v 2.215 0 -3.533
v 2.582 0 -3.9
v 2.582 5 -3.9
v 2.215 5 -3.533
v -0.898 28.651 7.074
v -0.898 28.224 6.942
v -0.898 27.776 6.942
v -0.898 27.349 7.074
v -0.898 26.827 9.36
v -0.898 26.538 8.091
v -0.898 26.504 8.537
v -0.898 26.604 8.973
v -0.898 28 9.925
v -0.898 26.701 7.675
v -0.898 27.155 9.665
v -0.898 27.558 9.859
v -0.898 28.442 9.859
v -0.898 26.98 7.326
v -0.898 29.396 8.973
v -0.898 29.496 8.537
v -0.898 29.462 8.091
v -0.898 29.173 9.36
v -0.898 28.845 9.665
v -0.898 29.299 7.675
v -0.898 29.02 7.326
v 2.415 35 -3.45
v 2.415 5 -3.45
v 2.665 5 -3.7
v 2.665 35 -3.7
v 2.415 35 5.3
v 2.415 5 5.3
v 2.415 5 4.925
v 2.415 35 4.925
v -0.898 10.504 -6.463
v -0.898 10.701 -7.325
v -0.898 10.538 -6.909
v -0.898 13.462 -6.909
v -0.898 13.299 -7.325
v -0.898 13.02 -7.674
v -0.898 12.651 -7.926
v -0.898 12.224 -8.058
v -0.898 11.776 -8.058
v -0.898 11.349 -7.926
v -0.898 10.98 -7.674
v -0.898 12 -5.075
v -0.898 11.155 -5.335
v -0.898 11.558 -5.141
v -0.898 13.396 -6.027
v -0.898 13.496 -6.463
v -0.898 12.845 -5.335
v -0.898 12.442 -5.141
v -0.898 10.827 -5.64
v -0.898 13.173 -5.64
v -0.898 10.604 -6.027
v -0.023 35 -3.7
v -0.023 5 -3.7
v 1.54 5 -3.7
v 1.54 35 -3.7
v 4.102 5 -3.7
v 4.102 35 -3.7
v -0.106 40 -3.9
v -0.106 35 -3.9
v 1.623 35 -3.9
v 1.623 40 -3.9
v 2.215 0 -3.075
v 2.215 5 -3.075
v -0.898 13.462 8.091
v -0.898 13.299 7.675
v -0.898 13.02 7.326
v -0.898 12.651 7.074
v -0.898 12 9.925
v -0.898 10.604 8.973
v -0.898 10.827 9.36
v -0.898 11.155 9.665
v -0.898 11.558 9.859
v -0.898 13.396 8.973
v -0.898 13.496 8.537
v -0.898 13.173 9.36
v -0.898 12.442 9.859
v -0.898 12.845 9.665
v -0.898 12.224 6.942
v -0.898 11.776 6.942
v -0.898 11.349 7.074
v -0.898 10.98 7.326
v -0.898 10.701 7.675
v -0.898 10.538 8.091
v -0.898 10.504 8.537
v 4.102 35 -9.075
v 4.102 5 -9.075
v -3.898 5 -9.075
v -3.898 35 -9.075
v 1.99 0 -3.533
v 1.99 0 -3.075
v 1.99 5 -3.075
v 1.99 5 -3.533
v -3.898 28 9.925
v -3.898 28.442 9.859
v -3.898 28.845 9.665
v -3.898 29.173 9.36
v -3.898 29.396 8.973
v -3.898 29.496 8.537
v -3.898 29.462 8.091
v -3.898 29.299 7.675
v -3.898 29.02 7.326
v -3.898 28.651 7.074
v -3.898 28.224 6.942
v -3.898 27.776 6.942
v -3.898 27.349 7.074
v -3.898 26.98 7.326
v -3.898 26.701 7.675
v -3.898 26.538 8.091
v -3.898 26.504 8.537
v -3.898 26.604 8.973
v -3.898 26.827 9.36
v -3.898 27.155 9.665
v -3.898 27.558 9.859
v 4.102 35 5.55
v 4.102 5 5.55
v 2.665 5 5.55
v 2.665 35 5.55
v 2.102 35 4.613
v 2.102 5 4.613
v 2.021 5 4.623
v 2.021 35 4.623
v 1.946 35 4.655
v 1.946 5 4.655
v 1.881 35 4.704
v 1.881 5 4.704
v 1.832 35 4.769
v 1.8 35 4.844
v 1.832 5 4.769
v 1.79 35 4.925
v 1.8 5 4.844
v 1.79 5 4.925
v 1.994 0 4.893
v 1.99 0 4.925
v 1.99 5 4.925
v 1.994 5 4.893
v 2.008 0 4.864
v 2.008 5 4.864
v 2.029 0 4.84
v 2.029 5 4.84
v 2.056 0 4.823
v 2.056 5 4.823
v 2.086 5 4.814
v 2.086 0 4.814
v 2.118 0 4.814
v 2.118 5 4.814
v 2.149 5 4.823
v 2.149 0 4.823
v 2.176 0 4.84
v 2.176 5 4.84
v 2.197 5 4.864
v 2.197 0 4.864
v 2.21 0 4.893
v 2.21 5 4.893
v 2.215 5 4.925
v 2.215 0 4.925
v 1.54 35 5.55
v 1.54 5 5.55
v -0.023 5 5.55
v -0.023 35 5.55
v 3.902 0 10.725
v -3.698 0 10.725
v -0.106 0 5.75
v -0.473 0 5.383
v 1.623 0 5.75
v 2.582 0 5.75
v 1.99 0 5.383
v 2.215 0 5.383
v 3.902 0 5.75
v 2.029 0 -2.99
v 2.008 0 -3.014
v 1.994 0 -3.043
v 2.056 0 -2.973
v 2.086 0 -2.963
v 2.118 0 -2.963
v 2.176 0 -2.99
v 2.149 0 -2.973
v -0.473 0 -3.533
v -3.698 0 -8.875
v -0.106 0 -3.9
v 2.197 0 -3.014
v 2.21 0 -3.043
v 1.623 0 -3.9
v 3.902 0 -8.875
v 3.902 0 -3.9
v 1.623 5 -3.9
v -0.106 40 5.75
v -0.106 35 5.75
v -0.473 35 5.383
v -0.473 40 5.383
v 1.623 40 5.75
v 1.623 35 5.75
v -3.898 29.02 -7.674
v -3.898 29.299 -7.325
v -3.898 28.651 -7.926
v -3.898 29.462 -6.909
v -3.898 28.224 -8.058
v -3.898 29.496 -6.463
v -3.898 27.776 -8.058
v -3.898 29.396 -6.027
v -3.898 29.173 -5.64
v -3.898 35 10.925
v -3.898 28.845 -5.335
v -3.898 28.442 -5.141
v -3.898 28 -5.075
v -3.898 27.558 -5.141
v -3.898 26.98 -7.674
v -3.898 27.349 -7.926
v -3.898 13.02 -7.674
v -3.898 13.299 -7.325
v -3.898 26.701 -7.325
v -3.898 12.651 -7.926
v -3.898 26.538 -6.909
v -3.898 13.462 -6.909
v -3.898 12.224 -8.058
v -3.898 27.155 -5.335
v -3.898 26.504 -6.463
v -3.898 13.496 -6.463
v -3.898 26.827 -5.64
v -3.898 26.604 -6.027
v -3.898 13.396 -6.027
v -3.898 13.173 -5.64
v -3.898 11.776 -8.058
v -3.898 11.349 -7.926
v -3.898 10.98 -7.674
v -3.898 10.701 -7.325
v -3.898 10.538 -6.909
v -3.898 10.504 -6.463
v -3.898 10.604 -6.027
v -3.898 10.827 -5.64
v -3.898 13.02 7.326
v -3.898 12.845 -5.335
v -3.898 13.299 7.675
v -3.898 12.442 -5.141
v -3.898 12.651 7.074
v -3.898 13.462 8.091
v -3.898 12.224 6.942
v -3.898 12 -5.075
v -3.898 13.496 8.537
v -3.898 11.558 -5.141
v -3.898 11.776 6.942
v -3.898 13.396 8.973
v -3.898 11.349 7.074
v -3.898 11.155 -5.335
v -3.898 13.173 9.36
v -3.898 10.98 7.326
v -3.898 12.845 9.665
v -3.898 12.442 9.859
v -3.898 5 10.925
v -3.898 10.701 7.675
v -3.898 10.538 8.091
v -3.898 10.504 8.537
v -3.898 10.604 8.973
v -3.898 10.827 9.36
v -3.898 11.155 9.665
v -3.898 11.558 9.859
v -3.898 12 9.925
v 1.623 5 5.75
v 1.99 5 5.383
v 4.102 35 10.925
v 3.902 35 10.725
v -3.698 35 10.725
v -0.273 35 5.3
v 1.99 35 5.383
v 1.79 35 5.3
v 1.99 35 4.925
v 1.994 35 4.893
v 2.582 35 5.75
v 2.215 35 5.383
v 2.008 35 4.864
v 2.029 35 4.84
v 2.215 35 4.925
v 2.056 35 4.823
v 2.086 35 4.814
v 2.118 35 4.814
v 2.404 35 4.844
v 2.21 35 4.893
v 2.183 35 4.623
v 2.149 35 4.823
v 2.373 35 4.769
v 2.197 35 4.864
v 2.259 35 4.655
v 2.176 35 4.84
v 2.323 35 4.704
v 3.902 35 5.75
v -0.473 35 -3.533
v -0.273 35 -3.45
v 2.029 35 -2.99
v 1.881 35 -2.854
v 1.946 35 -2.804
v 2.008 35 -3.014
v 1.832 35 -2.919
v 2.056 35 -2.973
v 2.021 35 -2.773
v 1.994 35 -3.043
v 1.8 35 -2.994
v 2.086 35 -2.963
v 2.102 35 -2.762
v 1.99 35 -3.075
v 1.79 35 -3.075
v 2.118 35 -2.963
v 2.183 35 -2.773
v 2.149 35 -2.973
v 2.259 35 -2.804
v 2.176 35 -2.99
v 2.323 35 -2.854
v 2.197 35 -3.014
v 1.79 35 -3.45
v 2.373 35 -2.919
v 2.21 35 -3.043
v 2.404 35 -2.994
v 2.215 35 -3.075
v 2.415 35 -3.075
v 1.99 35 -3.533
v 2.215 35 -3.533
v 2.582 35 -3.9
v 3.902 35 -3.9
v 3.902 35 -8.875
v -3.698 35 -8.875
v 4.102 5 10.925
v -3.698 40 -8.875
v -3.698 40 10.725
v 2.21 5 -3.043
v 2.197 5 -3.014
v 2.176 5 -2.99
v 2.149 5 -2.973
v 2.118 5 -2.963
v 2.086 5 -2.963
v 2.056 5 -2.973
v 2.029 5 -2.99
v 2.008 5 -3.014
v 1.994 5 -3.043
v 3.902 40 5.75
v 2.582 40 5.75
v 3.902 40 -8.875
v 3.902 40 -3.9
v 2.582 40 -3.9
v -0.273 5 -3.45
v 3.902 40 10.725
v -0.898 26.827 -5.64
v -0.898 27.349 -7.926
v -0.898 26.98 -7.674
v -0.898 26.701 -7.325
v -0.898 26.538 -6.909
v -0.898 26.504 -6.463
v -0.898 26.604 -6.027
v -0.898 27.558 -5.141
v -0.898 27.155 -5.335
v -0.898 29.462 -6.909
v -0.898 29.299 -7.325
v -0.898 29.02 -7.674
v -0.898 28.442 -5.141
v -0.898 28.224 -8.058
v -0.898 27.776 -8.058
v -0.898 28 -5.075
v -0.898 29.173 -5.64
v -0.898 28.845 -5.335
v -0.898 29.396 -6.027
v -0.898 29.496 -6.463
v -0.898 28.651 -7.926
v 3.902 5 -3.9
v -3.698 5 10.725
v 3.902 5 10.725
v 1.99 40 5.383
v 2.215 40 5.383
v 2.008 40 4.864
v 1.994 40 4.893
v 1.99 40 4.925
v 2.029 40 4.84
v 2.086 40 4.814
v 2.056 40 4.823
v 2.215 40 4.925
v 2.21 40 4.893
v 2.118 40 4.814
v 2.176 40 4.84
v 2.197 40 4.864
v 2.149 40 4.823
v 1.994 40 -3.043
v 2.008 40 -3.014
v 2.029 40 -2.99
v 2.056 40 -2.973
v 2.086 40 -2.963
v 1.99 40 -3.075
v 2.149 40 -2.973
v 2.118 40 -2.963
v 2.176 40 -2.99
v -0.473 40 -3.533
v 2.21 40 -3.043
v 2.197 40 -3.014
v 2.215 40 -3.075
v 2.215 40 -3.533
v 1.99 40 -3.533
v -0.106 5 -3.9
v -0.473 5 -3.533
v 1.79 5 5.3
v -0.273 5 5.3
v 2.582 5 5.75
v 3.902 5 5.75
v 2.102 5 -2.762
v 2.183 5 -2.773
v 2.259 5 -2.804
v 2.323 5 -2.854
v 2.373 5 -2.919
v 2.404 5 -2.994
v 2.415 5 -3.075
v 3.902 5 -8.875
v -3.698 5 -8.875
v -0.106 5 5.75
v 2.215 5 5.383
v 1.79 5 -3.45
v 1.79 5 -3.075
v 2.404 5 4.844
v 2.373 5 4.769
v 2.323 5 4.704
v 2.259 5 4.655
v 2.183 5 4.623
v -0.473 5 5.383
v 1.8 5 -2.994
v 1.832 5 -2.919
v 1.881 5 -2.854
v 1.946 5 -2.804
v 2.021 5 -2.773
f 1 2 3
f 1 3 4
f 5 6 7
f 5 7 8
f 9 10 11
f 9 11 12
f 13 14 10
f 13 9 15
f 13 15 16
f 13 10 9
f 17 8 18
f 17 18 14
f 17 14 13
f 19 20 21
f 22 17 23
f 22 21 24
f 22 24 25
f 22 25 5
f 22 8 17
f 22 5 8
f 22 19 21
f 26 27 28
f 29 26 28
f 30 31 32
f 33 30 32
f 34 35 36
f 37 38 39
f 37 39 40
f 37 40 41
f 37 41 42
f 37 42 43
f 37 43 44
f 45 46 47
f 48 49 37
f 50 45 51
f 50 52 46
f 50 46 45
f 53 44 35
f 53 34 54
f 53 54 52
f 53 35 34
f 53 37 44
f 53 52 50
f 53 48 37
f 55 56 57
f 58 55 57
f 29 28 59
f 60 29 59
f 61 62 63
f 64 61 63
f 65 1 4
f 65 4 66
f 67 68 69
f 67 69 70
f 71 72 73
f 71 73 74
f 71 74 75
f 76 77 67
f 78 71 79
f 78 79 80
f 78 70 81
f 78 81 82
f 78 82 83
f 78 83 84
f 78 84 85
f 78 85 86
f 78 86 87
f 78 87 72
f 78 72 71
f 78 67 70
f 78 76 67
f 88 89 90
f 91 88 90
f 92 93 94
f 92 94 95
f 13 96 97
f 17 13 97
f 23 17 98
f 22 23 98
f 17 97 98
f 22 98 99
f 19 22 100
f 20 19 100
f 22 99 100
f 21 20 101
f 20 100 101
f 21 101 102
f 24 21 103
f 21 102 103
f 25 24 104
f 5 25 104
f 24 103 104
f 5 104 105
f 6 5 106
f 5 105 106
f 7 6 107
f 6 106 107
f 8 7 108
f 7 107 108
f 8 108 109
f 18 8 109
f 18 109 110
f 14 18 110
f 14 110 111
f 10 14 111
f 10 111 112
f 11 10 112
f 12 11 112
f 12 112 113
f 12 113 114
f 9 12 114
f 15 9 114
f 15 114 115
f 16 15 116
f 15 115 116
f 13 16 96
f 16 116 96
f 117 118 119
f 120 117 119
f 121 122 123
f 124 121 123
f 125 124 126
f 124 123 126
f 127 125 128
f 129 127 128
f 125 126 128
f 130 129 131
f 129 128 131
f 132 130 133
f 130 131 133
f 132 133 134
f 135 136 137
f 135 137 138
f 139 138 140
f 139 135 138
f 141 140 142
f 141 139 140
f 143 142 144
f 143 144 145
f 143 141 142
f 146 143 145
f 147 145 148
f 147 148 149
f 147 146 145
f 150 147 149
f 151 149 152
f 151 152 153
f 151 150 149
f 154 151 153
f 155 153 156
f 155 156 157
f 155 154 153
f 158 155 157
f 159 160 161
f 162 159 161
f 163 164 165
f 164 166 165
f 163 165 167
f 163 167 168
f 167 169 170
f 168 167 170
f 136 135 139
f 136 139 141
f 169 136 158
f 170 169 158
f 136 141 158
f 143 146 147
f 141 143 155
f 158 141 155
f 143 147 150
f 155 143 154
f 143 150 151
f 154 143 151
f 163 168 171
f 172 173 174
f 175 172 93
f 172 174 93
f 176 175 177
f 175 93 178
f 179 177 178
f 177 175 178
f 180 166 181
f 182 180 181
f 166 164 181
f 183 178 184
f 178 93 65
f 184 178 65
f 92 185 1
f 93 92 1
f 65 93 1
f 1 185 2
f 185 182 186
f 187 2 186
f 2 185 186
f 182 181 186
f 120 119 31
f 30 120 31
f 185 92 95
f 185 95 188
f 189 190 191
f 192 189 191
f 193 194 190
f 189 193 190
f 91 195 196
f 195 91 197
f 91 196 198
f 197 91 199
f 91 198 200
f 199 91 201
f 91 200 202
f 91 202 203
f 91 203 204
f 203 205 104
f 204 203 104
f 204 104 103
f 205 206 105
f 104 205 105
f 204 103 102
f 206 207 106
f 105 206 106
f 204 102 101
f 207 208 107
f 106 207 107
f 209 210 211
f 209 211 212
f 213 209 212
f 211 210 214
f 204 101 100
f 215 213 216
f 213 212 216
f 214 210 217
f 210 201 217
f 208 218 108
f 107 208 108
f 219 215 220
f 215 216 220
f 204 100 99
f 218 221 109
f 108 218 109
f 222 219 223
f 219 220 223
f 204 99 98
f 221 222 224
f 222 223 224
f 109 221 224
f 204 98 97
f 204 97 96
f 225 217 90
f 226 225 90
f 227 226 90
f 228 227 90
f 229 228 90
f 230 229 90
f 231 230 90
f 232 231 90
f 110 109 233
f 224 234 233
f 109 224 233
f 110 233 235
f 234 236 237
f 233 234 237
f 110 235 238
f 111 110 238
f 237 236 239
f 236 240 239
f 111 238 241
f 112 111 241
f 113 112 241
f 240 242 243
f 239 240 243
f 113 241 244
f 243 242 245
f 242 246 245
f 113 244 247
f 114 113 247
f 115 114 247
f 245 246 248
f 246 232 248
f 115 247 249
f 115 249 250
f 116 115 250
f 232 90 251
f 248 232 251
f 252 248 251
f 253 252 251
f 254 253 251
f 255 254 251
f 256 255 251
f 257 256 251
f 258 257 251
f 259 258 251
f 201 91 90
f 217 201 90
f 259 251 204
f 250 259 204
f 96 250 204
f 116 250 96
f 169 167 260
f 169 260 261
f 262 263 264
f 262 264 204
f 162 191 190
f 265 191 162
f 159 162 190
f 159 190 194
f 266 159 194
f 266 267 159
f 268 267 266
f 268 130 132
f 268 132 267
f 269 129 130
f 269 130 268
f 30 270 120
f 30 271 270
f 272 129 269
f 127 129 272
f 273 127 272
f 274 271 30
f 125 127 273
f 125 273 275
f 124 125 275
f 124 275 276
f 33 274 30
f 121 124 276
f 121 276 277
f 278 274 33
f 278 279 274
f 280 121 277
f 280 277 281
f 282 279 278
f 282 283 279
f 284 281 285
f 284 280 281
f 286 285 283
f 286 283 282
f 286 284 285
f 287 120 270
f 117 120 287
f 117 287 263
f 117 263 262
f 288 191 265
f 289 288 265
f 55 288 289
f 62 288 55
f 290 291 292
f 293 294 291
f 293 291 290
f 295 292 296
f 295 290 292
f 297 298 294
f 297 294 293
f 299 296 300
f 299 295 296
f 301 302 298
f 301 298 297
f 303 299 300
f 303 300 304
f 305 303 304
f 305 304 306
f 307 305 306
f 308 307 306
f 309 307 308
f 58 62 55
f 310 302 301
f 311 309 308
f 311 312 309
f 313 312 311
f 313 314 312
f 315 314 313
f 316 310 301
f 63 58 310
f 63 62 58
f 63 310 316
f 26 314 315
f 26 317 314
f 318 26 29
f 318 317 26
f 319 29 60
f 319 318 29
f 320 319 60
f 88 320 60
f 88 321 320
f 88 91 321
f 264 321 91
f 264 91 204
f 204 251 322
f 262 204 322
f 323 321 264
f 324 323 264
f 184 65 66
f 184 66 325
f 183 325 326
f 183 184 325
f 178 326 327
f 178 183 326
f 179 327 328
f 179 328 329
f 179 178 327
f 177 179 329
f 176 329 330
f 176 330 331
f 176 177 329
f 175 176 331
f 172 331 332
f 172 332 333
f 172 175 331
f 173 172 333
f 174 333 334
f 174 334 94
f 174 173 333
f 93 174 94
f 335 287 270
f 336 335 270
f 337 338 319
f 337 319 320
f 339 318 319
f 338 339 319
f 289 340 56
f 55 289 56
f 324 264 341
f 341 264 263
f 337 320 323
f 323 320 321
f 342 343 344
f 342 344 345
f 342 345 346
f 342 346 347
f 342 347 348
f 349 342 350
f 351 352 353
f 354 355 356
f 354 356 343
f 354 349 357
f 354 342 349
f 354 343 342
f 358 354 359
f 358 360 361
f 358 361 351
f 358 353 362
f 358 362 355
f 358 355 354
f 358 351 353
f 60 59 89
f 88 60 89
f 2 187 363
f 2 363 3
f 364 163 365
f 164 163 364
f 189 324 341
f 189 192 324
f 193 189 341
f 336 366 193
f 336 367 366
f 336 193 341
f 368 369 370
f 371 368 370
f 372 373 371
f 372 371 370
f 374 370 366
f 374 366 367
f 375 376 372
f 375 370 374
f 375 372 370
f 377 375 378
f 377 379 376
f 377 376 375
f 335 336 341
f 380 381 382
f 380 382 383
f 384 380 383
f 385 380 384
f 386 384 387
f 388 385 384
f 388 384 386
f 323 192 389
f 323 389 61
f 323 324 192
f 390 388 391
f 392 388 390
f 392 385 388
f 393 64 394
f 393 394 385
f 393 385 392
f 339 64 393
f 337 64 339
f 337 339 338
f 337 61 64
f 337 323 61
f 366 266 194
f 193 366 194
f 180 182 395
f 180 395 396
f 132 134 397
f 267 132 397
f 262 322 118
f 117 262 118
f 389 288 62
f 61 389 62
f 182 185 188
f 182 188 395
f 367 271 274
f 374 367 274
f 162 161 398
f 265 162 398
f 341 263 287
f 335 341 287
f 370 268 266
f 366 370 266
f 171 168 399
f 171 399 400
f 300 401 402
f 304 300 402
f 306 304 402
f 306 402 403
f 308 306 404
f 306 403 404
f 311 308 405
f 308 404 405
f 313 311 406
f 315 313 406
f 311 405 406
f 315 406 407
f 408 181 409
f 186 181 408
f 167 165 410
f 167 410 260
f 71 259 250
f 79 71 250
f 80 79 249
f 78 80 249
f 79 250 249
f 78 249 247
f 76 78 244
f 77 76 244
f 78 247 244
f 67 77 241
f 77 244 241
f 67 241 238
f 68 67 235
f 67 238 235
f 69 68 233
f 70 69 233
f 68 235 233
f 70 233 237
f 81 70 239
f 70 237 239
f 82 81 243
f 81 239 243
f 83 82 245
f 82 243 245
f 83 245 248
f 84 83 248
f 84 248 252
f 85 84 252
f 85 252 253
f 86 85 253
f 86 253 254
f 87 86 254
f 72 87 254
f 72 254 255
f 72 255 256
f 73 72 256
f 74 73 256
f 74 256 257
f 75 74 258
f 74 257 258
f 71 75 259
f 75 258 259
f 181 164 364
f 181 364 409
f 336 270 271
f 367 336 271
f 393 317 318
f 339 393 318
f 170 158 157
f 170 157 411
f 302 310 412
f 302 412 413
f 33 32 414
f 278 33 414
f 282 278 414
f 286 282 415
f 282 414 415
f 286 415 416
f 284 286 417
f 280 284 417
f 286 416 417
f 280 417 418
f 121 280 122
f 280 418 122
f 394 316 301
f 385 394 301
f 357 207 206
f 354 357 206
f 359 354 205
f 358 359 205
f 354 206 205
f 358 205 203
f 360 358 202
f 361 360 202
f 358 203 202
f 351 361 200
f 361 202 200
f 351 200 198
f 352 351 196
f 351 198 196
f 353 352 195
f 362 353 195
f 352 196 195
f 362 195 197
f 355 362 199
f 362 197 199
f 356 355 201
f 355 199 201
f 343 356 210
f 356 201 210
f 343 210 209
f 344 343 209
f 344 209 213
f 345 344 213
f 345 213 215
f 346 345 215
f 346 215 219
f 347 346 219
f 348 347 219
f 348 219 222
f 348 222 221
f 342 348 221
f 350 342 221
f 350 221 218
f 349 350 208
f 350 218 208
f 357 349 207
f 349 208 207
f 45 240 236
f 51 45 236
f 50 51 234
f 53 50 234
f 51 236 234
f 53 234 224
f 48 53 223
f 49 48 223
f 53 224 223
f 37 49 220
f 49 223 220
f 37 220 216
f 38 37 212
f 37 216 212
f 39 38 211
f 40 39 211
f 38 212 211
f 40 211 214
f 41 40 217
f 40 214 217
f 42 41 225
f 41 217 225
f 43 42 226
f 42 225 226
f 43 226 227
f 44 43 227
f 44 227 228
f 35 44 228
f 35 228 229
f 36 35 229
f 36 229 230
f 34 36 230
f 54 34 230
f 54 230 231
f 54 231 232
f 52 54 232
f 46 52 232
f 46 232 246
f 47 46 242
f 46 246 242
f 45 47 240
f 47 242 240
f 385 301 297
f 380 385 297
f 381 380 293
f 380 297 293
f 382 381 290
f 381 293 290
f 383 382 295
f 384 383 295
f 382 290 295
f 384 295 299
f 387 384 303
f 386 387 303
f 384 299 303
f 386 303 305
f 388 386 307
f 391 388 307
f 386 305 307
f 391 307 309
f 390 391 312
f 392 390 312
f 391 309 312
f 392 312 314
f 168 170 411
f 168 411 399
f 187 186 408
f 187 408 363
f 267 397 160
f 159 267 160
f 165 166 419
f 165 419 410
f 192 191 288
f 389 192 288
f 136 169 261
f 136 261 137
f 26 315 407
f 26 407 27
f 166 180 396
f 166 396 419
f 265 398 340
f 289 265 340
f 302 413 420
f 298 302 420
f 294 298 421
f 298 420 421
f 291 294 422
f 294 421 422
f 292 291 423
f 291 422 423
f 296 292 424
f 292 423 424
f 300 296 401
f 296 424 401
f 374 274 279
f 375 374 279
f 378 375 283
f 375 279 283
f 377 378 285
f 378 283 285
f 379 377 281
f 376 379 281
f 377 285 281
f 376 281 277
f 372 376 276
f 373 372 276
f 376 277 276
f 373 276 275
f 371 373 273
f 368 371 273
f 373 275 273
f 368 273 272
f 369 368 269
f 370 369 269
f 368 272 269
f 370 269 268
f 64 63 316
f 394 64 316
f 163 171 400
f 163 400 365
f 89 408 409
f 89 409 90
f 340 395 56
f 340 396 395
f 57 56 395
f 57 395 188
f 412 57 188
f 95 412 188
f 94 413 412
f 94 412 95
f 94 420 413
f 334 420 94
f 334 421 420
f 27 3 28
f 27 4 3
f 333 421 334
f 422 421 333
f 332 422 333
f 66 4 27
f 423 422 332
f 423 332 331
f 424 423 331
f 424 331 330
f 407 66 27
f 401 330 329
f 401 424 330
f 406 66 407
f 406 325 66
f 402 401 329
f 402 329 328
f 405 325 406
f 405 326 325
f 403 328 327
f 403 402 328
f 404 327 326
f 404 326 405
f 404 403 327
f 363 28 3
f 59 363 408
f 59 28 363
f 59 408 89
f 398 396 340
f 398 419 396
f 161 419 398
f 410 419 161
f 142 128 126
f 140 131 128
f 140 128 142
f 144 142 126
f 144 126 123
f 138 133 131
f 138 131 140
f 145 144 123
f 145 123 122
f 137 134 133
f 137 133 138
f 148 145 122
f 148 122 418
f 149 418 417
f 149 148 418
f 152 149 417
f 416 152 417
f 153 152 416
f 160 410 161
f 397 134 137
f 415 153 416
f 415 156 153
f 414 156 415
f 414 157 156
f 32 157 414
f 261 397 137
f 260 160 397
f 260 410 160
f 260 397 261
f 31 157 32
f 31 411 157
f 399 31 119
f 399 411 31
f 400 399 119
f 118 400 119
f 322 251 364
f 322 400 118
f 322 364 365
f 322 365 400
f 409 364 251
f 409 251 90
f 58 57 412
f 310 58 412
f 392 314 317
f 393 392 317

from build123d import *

# Parameters (mm, degrees)
BOSS_EXTRUDE1_DEPTH = 40
CUT_EXTRUDE6_START  = -5
CUT_EXTRUDE6_DEPTH  = 5
CUT_EXTRUDE7_DEPTH  = 5
SKETCH10_R          = 1.5
CUT_EXTRUDE8_DEPTH  = 3
CUT_EXTRUDE4_START  = -5
CUT_EXTRUDE4_DEPTH  = 5
CUT_EXTRUDE5_DEPTH  = 5


with BuildPart() as part:
    # Sketch1 → Boss-Extrude1 (new body)
    with BuildSketch(Plane(origin=(0, 0, 0), x_dir=(1, 0, 0), z_dir=(0, 1, 0))):
        with BuildLine():
            Line((-3.897731109, -10.925164292), (4.102268891, -10.925164292))
            Line((4.102268891, -10.925164292), (4.102268891, -5.550166604))
            Line((4.102268891, -5.550166604), (3.383518531, -5.550166604))
            Line((3.383518531, -5.550166604), (2.664768172, -5.550166604))
            Line((2.664768172, -5.550166604), (2.414768047, -5.300166479))
            Line((2.414768047, -5.300166479), (2.414768047, -4.925166292))
            ThreePointArc((2.414768047, -4.925166292), (2.32323887, -4.704195312), (2.102267891, -4.612666136))
            ThreePointArc((2.102267891, -4.612666136), (1.881296911, -4.704195312), (1.789767734, -4.925166292))
            Line((1.789767734, -4.925166292), (1.789767734, -5.300166479))
            Line((1.789767734, -5.300166479), (1.539767609, -5.550166604))
            Line((1.539767609, -5.550166604), (-0.022733172, -5.550166604))
            Line((-0.022733172, -5.550166604), (-0.272733297, -5.300166479))
            Line((-0.272733297, -5.300166479), (-0.272733297, 3.449837896))
            Line((-0.272733297, 3.449837896), (-0.022733172, 3.699838021))
            Line((-0.022733172, 3.699838021), (1.539767609, 3.699838021))
            Line((1.539767609, 3.699838021), (1.789767734, 3.449837896))
            Line((1.789767734, 3.449837896), (1.789767734, 3.074837708))
            ThreePointArc((1.789767734, 3.074837708), (1.881296911, 2.853866728), (2.102267891, 2.762337552))
            ThreePointArc((2.102267891, 2.762337552), (2.32323887, 2.853866728), (2.414768047, 3.074837708))
            Line((2.414768047, 3.074837708), (2.414768047, 3.449837896))
            Line((2.414768047, 3.449837896), (2.664768172, 3.699838021))
            Line((2.664768172, 3.699838021), (3.383518531, 3.699838021))
            Line((3.383518531, 3.699838021), (4.102268891, 3.699838021))
            Line((4.102268891, 3.699838021), (4.102268891, 9.074835708))
            Line((4.102268891, 9.074835708), (-3.897731109, 9.074835708))
            Line((-3.897731109, 9.074835708), (-3.897731109, -10.925164292))
        make_face()
    extrude(amount=BOSS_EXTRUDE1_DEPTH)

    # Sketch8 → Cut-Extrude6 (cut)
    with BuildSketch(Plane(origin=(0, 40, 0), x_dir=(1, 0, 0), z_dir=(0, 1, 0)).offset(CUT_EXTRUDE6_START)):
        with BuildLine():
            Line((2.414768047, 3.074837708), (2.414768047, 3.449837896))
            Line((2.414768047, 3.449837896), (2.664768172, 3.699838021))
            Line((2.664768172, 3.699838021), (4.102268891, 3.699838021))
            Line((4.102268891, 3.699838021), (4.102268891, 9.074835708))
            Line((4.102268891, 9.074835708), (-3.897731109, 9.074835708))
            Line((-3.897731109, 9.074835708), (-3.897731109, -10.925164292))
            Line((-3.897731109, -10.925164292), (4.102268891, -10.925164292))
            Line((4.102268891, -10.925164292), (4.102268891, -5.550166604))
            Line((4.102268891, -5.550166604), (2.664768172, -5.550166604))
            Line((2.664768172, -5.550166604), (2.414768047, -5.300166479))
            Line((2.414768047, -5.300166479), (2.414768047, -4.925166292))
            ThreePointArc((2.414768047, -4.925166292), (2.102267891, -4.612666136), (1.789767734, -4.925166292))
            Line((1.789767734, -4.925166292), (1.789767734, -5.300166479))
            Line((1.789767734, -5.300166479), (1.539767609, -5.550166604))
            Line((1.539767609, -5.550166604), (-0.022733172, -5.550166604))
            Line((-0.022733172, -5.550166604), (-0.272733297, -5.300166479))
            Line((-0.272733297, -5.300166479), (-0.272733297, 3.449837896))
            Line((-0.272733297, 3.449837896), (-0.022733172, 3.699838021))
            Line((-0.022733172, 3.699838021), (1.539767609, 3.699838021))
            Line((1.539767609, 3.699838021), (1.789767734, 3.449837896))
            Line((1.789767734, 3.449837896), (1.789767734, 3.074837708))
            ThreePointArc((1.789767734, 3.074837708), (2.102267891, 2.762337552), (2.414768047, 3.074837708))
        make_face()
        with BuildLine():
            Line((2.314768047, 3.074837708), (2.314768047, 3.491259252))
            Line((2.314768047, 3.491259252), (2.623346816, 3.799838021))
            Line((2.623346816, 3.799838021), (4.002268891, 3.799838021))
            Line((4.002268891, 3.799838021), (4.002268891, 8.974835708))
            Line((4.002268891, 8.974835708), (-3.797731109, 8.974835708))
            Line((-3.797731109, 8.974835708), (-3.797731109, -10.825164292))
            Line((-3.797731109, -10.825164292), (4.002268891, -10.825164292))
            Line((4.002268891, -10.825164292), (4.002268891, -5.650166604))
            Line((4.002268891, -5.650166604), (2.623346816, -5.650166604))
            Line((2.623346816, -5.650166604), (2.314768047, -5.341587836))
            Line((2.314768047, -5.341587836), (2.314768047, -4.925166292))
            ThreePointArc((2.314768047, -4.925166292), (2.102267891, -4.712666136), (1.889767734, -4.925166292))
            Line((1.889767734, -4.925166292), (1.889767734, -5.341587836))
            Line((1.889767734, -5.341587836), (1.581188966, -5.650166604))
            Line((1.581188966, -5.650166604), (-0.064154528, -5.650166604))
            Line((-0.064154528, -5.650166604), (-0.372733297, -5.341587836))
            Line((-0.372733297, -5.341587836), (-0.372733297, 3.491259252))
            Line((-0.372733297, 3.491259252), (-0.064154528, 3.799838021))
            Line((-0.064154528, 3.799838021), (1.581188966, 3.799838021))
            Line((1.581188966, 3.799838021), (1.889767734, 3.491259252))
            Line((1.889767734, 3.491259252), (1.889767734, 3.074837708))
            ThreePointArc((1.889767734, 3.074837708), (2.102267891, 2.862337552), (2.314768047, 3.074837708))
        make_face(mode=Mode.SUBTRACT)
    extrude(amount=CUT_EXTRUDE6_DEPTH, mode=Mode.SUBTRACT)

    # Sketch9 → Cut-Extrude7 (cut)
    with BuildSketch(Plane.XZ):
        with BuildLine():
            Line((1.789767734, -3.074837708), (1.789767734, -3.449837896))
            Line((1.789767734, -3.449837896), (1.539767609, -3.699838021))
            Line((1.539767609, -3.699838021), (-0.022733172, -3.699838021))
            Line((-0.022733172, -3.699838021), (-0.272733297, -3.449837896))
            Line((-0.272733297, -3.449837896), (-0.272733297, 5.300166479))
            Line((-0.272733297, 5.300166479), (-0.022733172, 5.550166604))
            Line((-0.022733172, 5.550166604), (1.539767609, 5.550166604))
            Line((1.539767609, 5.550166604), (1.789767734, 5.300166479))
            Line((1.789767734, 5.300166479), (1.789767734, 4.925166292))
            ThreePointArc((1.789767734, 4.925166292), (2.102267891, 4.612666136), (2.414768047, 4.925166292))
            Line((2.414768047, 4.925166292), (2.414768047, 5.300166479))
            Line((2.414768047, 5.300166479), (2.664768172, 5.550166604))
            Line((2.664768172, 5.550166604), (4.102268891, 5.550166604))
            Line((4.102268891, 5.550166604), (4.102268891, 10.925164292))
            Line((4.102268891, 10.925164292), (-3.897731109, 10.925164292))
            Line((-3.897731109, 10.925164292), (-3.897731109, -9.074835708))
            Line((-3.897731109, -9.074835708), (4.102268891, -9.074835708))
            Line((4.102268891, -9.074835708), (4.102268891, -3.699838021))
            Line((4.102268891, -3.699838021), (2.664768172, -3.699838021))
            Line((2.664768172, -3.699838021), (2.414768047, -3.449837896))
            Line((2.414768047, -3.449837896), (2.414768047, -3.074837708))
            ThreePointArc((2.414768047, -3.074837708), (2.102267891, -2.762337552), (1.789767734, -3.074837708))
        make_face()
        with BuildLine():
            Line((1.889767734, -3.074837708), (1.889767734, -3.491259252))
            Line((1.889767734, -3.491259252), (1.581188966, -3.799838021))
            Line((1.581188966, -3.799838021), (-0.064154528, -3.799838021))
            Line((-0.064154528, -3.799838021), (-0.372733297, -3.491259252))
            Line((-0.372733297, -3.491259252), (-0.372733297, 5.341587836))
            Line((-0.372733297, 5.341587836), (-0.064154528, 5.650166604))
            Line((-0.064154528, 5.650166604), (1.581188966, 5.650166604))
            Line((1.581188966, 5.650166604), (1.889767734, 5.341587836))
            Line((1.889767734, 5.341587836), (1.889767734, 4.925166292))
            ThreePointArc((1.889767734, 4.925166292), (2.102267891, 4.712666136), (2.314768047, 4.925166292))
            Line((2.314768047, 4.925166292), (2.314768047, 5.341587836))
            Line((2.314768047, 5.341587836), (2.623346816, 5.650166604))
            Line((2.623346816, 5.650166604), (4.002268891, 5.650166604))
            Line((4.002268891, 5.650166604), (4.002268891, 10.825164292))
            Line((4.002268891, 10.825164292), (-3.797731109, 10.825164292))
            Line((-3.797731109, 10.825164292), (-3.797731109, -8.974835708))
            Line((-3.797731109, -8.974835708), (4.002268891, -8.974835708))
            Line((4.002268891, -8.974835708), (4.002268891, -3.799838021))
            Line((4.002268891, -3.799838021), (2.623346816, -3.799838021))
            Line((2.623346816, -3.799838021), (2.314768047, -3.491259252))
            Line((2.314768047, -3.491259252), (2.314768047, -3.074837708))
            ThreePointArc((2.314768047, -3.074837708), (2.102267891, -2.862337552), (1.889767734, -3.074837708))
        make_face(mode=Mode.SUBTRACT)
    extrude(amount=-CUT_EXTRUDE7_DEPTH, mode=Mode.SUBTRACT)

    # Sketch10 → Cut-Extrude8 (cut)
    with BuildSketch(Plane.ZY.offset(3.897731109)):
        with Locations((-6.574835708, 28)):
            Circle(SKETCH10_R)
        with Locations((8.425164292, 28)):
            Circle(SKETCH10_R)
        with Locations((8.425164292, 12)):
            Circle(SKETCH10_R)
        with Locations((-6.574835708, 12)):
            Circle(SKETCH10_R)
    extrude(amount=-CUT_EXTRUDE8_DEPTH, mode=Mode.SUBTRACT)

    # Sketch5 → Cut-Extrude4 (cut)
    with BuildSketch(Plane(origin=(0, 40, 0), x_dir=(1, 0, 0), z_dir=(0, 1, 0)).offset(CUT_EXTRUDE4_START)):
        with BuildLine():
            Line((1.889767734, 3.491259252), (1.889767734, 3.074837708))
            ThreePointArc((1.889767734, 3.074837708), (2.102267891, 2.862337552), (2.314768047, 3.074837708))
            Line((2.314768047, 3.074837708), (2.314768047, 3.491259252))
            Line((2.314768047, 3.491259252), (2.623346816, 3.799838021))
            Line((2.623346816, 3.799838021), (4.002268891, 3.799838021))
            Line((4.002268891, 3.799838021), (4.002268891, 8.974835708))
            Line((4.002268891, 8.974835708), (-3.797731109, 8.974835708))
            Line((-3.797731109, 8.974835708), (-3.797731109, -10.825164292))
            Line((-3.797731109, -10.825164292), (4.002268891, -10.825164292))
            Line((4.002268891, -10.825164292), (4.002268891, -5.650166604))
            Line((4.002268891, -5.650166604), (2.623346816, -5.650166604))
            Line((2.623346816, -5.650166604), (2.314768047, -5.341587836))
            Line((2.314768047, -5.341587836), (2.314768047, -4.925166292))
            ThreePointArc((2.314768047, -4.925166292), (2.102267891, -4.712666136), (1.889767734, -4.925166292))
            Line((1.889767734, -4.925166292), (1.889767734, -5.341587836))
            Line((1.889767734, -5.341587836), (1.581188966, -5.650166604))
            Line((1.581188966, -5.650166604), (-0.064154528, -5.650166604))
            Line((-0.064154528, -5.650166604), (-0.372733297, -5.341587836))
            Line((-0.372733297, -5.341587836), (-0.372733297, 3.491259252))
            Line((-0.372733297, 3.491259252), (-0.064154528, 3.799838021))
            Line((-0.064154528, 3.799838021), (1.581188966, 3.799838021))
            Line((1.581188966, 3.799838021), (1.889767734, 3.491259252))
        make_face()
        with BuildLine():
            Line((1.989767734, 3.532680608), (1.989767734, 3.074837708))
            ThreePointArc((1.989767734, 3.074837708), (2.102267891, 2.962337552), (2.214768047, 3.074837708))
            Line((2.214768047, 3.074837708), (2.214768047, 3.532680608))
            Line((2.214768047, 3.532680608), (2.581925459, 3.899838021))
            Line((2.581925459, 3.899838021), (3.902268891, 3.899838021))
            Line((3.902268891, 3.899838021), (3.902268891, 8.874835708))
            Line((3.902268891, 8.874835708), (-3.697731109, 8.874835708))
            Line((-3.697731109, 8.874835708), (-3.697731109, -10.725164292))
            Line((-3.697731109, -10.725164292), (3.902268891, -10.725164292))
            Line((3.902268891, -10.725164292), (3.902268891, -5.750166604))
            Line((3.902268891, -5.750166604), (2.581925459, -5.750166604))
            Line((2.581925459, -5.750166604), (2.214768047, -5.383009192))
            Line((2.214768047, -5.383009192), (2.214768047, -4.925166292))
            ThreePointArc((2.214768047, -4.925166292), (2.102267891, -4.812666136), (1.989767734, -4.925166292))
            Line((1.989767734, -4.925166292), (1.989767734, -5.383009192))
            Line((1.989767734, -5.383009192), (1.622610322, -5.750166604))
            Line((1.622610322, -5.750166604), (-0.105575884, -5.750166604))
            Line((-0.105575884, -5.750166604), (-0.472733297, -5.383009192))
            Line((-0.472733297, -5.383009192), (-0.472733297, 3.532680608))
            Line((-0.472733297, 3.532680608), (-0.105575884, 3.899838021))
            Line((-0.105575884, 3.899838021), (1.622610322, 3.899838021))
            Line((1.622610322, 3.899838021), (1.989767734, 3.532680608))
        make_face(mode=Mode.SUBTRACT)
    extrude(amount=CUT_EXTRUDE4_DEPTH, mode=Mode.SUBTRACT)

    # Sketch6 → Cut-Extrude5 (cut)
    with BuildSketch(Plane.XZ):
        with BuildLine():
            Line((1.889767734, -3.491259252), (1.581188966, -3.799838021))
            Line((1.581188966, -3.799838021), (-0.064154528, -3.799838021))
            Line((-0.064154528, -3.799838021), (-0.372733297, -3.491259252))
            Line((-0.372733297, -3.491259252), (-0.372733297, 5.341587836))
            Line((-0.372733297, 5.341587836), (-0.064154528, 5.650166604))
            Line((-0.064154528, 5.650166604), (1.581188966, 5.650166604))
            Line((1.581188966, 5.650166604), (1.889767734, 5.341587836))
            Line((1.889767734, 5.341587836), (1.889767734, 4.925166292))
            ThreePointArc((1.889767734, 4.925166292), (2.102267891, 4.712666136), (2.314768047, 4.925166292))
            Line((2.314768047, 4.925166292), (2.314768047, 5.341587836))
            Line((2.314768047, 5.341587836), (2.623346816, 5.650166604))
            Line((2.623346816, 5.650166604), (4.002268891, 5.650166604))
            Line((4.002268891, 5.650166604), (4.002268891, 10.825164292))
            Line((4.002268891, 10.825164292), (-3.797731109, 10.825164292))
            Line((-3.797731109, 10.825164292), (-3.797731109, -8.974835708))
            Line((-3.797731109, -8.974835708), (4.002268891, -8.974835708))
            Line((4.002268891, -8.974835708), (4.002268891, -3.799838021))
            Line((4.002268891, -3.799838021), (2.623346816, -3.799838021))
            Line((2.623346816, -3.799838021), (2.314768047, -3.491259252))
            Line((2.314768047, -3.491259252), (2.314768047, -3.074837708))
            ThreePointArc((2.314768047, -3.074837708), (2.102267891, -2.862337552), (1.889767734, -3.074837708))
            Line((1.889767734, -3.074837708), (1.889767734, -3.491259252))
        make_face()
        with BuildLine():
            Line((1.622610322, -3.899838021), (-0.105575884, -3.899838021))
            Line((-0.105575884, -3.899838021), (-0.472733297, -3.532680608))
            Line((-0.472733297, -3.532680608), (-0.472733297, 5.383009192))
            Line((-0.472733297, 5.383009192), (-0.105575884, 5.750166604))
            Line((-0.105575884, 5.750166604), (1.622610322, 5.750166604))
            Line((1.622610322, 5.750166604), (1.989767734, 5.383009192))
            Line((1.989767734, 5.383009192), (1.989767734, 4.925166292))
            ThreePointArc((1.989767734, 4.925166292), (2.102267891, 4.812666136), (2.214768047, 4.925166292))
            Line((2.214768047, 4.925166292), (2.214768047, 5.383009192))
            Line((2.214768047, 5.383009192), (2.581925459, 5.750166604))
            Line((2.581925459, 5.750166604), (3.902268891, 5.750166604))
            Line((3.902268891, 5.750166604), (3.902268891, 10.725164292))
            Line((3.902268891, 10.725164292), (-3.697731109, 10.725164292))
            Line((-3.697731109, 10.725164292), (-3.697731109, -8.874835708))
            Line((-3.697731109, -8.874835708), (3.902268891, -8.874835708))
            Line((3.902268891, -8.874835708), (3.902268891, -3.899838021))
            Line((3.902268891, -3.899838021), (2.581925459, -3.899838021))
            Line((2.581925459, -3.899838021), (2.214768047, -3.532680608))
            Line((2.214768047, -3.532680608), (2.214768047, -3.074837708))
            ThreePointArc((2.214768047, -3.074837708), (2.102267891, -2.962337552), (1.989767734, -3.074837708))
            Line((1.989767734, -3.074837708), (1.989767734, -3.532680608))
            Line((1.989767734, -3.532680608), (1.622610322, -3.899838021))
        make_face(mode=Mode.SUBTRACT)
    extrude(amount=-CUT_EXTRUDE5_DEPTH, mode=Mode.SUBTRACT)


solid = part.part
